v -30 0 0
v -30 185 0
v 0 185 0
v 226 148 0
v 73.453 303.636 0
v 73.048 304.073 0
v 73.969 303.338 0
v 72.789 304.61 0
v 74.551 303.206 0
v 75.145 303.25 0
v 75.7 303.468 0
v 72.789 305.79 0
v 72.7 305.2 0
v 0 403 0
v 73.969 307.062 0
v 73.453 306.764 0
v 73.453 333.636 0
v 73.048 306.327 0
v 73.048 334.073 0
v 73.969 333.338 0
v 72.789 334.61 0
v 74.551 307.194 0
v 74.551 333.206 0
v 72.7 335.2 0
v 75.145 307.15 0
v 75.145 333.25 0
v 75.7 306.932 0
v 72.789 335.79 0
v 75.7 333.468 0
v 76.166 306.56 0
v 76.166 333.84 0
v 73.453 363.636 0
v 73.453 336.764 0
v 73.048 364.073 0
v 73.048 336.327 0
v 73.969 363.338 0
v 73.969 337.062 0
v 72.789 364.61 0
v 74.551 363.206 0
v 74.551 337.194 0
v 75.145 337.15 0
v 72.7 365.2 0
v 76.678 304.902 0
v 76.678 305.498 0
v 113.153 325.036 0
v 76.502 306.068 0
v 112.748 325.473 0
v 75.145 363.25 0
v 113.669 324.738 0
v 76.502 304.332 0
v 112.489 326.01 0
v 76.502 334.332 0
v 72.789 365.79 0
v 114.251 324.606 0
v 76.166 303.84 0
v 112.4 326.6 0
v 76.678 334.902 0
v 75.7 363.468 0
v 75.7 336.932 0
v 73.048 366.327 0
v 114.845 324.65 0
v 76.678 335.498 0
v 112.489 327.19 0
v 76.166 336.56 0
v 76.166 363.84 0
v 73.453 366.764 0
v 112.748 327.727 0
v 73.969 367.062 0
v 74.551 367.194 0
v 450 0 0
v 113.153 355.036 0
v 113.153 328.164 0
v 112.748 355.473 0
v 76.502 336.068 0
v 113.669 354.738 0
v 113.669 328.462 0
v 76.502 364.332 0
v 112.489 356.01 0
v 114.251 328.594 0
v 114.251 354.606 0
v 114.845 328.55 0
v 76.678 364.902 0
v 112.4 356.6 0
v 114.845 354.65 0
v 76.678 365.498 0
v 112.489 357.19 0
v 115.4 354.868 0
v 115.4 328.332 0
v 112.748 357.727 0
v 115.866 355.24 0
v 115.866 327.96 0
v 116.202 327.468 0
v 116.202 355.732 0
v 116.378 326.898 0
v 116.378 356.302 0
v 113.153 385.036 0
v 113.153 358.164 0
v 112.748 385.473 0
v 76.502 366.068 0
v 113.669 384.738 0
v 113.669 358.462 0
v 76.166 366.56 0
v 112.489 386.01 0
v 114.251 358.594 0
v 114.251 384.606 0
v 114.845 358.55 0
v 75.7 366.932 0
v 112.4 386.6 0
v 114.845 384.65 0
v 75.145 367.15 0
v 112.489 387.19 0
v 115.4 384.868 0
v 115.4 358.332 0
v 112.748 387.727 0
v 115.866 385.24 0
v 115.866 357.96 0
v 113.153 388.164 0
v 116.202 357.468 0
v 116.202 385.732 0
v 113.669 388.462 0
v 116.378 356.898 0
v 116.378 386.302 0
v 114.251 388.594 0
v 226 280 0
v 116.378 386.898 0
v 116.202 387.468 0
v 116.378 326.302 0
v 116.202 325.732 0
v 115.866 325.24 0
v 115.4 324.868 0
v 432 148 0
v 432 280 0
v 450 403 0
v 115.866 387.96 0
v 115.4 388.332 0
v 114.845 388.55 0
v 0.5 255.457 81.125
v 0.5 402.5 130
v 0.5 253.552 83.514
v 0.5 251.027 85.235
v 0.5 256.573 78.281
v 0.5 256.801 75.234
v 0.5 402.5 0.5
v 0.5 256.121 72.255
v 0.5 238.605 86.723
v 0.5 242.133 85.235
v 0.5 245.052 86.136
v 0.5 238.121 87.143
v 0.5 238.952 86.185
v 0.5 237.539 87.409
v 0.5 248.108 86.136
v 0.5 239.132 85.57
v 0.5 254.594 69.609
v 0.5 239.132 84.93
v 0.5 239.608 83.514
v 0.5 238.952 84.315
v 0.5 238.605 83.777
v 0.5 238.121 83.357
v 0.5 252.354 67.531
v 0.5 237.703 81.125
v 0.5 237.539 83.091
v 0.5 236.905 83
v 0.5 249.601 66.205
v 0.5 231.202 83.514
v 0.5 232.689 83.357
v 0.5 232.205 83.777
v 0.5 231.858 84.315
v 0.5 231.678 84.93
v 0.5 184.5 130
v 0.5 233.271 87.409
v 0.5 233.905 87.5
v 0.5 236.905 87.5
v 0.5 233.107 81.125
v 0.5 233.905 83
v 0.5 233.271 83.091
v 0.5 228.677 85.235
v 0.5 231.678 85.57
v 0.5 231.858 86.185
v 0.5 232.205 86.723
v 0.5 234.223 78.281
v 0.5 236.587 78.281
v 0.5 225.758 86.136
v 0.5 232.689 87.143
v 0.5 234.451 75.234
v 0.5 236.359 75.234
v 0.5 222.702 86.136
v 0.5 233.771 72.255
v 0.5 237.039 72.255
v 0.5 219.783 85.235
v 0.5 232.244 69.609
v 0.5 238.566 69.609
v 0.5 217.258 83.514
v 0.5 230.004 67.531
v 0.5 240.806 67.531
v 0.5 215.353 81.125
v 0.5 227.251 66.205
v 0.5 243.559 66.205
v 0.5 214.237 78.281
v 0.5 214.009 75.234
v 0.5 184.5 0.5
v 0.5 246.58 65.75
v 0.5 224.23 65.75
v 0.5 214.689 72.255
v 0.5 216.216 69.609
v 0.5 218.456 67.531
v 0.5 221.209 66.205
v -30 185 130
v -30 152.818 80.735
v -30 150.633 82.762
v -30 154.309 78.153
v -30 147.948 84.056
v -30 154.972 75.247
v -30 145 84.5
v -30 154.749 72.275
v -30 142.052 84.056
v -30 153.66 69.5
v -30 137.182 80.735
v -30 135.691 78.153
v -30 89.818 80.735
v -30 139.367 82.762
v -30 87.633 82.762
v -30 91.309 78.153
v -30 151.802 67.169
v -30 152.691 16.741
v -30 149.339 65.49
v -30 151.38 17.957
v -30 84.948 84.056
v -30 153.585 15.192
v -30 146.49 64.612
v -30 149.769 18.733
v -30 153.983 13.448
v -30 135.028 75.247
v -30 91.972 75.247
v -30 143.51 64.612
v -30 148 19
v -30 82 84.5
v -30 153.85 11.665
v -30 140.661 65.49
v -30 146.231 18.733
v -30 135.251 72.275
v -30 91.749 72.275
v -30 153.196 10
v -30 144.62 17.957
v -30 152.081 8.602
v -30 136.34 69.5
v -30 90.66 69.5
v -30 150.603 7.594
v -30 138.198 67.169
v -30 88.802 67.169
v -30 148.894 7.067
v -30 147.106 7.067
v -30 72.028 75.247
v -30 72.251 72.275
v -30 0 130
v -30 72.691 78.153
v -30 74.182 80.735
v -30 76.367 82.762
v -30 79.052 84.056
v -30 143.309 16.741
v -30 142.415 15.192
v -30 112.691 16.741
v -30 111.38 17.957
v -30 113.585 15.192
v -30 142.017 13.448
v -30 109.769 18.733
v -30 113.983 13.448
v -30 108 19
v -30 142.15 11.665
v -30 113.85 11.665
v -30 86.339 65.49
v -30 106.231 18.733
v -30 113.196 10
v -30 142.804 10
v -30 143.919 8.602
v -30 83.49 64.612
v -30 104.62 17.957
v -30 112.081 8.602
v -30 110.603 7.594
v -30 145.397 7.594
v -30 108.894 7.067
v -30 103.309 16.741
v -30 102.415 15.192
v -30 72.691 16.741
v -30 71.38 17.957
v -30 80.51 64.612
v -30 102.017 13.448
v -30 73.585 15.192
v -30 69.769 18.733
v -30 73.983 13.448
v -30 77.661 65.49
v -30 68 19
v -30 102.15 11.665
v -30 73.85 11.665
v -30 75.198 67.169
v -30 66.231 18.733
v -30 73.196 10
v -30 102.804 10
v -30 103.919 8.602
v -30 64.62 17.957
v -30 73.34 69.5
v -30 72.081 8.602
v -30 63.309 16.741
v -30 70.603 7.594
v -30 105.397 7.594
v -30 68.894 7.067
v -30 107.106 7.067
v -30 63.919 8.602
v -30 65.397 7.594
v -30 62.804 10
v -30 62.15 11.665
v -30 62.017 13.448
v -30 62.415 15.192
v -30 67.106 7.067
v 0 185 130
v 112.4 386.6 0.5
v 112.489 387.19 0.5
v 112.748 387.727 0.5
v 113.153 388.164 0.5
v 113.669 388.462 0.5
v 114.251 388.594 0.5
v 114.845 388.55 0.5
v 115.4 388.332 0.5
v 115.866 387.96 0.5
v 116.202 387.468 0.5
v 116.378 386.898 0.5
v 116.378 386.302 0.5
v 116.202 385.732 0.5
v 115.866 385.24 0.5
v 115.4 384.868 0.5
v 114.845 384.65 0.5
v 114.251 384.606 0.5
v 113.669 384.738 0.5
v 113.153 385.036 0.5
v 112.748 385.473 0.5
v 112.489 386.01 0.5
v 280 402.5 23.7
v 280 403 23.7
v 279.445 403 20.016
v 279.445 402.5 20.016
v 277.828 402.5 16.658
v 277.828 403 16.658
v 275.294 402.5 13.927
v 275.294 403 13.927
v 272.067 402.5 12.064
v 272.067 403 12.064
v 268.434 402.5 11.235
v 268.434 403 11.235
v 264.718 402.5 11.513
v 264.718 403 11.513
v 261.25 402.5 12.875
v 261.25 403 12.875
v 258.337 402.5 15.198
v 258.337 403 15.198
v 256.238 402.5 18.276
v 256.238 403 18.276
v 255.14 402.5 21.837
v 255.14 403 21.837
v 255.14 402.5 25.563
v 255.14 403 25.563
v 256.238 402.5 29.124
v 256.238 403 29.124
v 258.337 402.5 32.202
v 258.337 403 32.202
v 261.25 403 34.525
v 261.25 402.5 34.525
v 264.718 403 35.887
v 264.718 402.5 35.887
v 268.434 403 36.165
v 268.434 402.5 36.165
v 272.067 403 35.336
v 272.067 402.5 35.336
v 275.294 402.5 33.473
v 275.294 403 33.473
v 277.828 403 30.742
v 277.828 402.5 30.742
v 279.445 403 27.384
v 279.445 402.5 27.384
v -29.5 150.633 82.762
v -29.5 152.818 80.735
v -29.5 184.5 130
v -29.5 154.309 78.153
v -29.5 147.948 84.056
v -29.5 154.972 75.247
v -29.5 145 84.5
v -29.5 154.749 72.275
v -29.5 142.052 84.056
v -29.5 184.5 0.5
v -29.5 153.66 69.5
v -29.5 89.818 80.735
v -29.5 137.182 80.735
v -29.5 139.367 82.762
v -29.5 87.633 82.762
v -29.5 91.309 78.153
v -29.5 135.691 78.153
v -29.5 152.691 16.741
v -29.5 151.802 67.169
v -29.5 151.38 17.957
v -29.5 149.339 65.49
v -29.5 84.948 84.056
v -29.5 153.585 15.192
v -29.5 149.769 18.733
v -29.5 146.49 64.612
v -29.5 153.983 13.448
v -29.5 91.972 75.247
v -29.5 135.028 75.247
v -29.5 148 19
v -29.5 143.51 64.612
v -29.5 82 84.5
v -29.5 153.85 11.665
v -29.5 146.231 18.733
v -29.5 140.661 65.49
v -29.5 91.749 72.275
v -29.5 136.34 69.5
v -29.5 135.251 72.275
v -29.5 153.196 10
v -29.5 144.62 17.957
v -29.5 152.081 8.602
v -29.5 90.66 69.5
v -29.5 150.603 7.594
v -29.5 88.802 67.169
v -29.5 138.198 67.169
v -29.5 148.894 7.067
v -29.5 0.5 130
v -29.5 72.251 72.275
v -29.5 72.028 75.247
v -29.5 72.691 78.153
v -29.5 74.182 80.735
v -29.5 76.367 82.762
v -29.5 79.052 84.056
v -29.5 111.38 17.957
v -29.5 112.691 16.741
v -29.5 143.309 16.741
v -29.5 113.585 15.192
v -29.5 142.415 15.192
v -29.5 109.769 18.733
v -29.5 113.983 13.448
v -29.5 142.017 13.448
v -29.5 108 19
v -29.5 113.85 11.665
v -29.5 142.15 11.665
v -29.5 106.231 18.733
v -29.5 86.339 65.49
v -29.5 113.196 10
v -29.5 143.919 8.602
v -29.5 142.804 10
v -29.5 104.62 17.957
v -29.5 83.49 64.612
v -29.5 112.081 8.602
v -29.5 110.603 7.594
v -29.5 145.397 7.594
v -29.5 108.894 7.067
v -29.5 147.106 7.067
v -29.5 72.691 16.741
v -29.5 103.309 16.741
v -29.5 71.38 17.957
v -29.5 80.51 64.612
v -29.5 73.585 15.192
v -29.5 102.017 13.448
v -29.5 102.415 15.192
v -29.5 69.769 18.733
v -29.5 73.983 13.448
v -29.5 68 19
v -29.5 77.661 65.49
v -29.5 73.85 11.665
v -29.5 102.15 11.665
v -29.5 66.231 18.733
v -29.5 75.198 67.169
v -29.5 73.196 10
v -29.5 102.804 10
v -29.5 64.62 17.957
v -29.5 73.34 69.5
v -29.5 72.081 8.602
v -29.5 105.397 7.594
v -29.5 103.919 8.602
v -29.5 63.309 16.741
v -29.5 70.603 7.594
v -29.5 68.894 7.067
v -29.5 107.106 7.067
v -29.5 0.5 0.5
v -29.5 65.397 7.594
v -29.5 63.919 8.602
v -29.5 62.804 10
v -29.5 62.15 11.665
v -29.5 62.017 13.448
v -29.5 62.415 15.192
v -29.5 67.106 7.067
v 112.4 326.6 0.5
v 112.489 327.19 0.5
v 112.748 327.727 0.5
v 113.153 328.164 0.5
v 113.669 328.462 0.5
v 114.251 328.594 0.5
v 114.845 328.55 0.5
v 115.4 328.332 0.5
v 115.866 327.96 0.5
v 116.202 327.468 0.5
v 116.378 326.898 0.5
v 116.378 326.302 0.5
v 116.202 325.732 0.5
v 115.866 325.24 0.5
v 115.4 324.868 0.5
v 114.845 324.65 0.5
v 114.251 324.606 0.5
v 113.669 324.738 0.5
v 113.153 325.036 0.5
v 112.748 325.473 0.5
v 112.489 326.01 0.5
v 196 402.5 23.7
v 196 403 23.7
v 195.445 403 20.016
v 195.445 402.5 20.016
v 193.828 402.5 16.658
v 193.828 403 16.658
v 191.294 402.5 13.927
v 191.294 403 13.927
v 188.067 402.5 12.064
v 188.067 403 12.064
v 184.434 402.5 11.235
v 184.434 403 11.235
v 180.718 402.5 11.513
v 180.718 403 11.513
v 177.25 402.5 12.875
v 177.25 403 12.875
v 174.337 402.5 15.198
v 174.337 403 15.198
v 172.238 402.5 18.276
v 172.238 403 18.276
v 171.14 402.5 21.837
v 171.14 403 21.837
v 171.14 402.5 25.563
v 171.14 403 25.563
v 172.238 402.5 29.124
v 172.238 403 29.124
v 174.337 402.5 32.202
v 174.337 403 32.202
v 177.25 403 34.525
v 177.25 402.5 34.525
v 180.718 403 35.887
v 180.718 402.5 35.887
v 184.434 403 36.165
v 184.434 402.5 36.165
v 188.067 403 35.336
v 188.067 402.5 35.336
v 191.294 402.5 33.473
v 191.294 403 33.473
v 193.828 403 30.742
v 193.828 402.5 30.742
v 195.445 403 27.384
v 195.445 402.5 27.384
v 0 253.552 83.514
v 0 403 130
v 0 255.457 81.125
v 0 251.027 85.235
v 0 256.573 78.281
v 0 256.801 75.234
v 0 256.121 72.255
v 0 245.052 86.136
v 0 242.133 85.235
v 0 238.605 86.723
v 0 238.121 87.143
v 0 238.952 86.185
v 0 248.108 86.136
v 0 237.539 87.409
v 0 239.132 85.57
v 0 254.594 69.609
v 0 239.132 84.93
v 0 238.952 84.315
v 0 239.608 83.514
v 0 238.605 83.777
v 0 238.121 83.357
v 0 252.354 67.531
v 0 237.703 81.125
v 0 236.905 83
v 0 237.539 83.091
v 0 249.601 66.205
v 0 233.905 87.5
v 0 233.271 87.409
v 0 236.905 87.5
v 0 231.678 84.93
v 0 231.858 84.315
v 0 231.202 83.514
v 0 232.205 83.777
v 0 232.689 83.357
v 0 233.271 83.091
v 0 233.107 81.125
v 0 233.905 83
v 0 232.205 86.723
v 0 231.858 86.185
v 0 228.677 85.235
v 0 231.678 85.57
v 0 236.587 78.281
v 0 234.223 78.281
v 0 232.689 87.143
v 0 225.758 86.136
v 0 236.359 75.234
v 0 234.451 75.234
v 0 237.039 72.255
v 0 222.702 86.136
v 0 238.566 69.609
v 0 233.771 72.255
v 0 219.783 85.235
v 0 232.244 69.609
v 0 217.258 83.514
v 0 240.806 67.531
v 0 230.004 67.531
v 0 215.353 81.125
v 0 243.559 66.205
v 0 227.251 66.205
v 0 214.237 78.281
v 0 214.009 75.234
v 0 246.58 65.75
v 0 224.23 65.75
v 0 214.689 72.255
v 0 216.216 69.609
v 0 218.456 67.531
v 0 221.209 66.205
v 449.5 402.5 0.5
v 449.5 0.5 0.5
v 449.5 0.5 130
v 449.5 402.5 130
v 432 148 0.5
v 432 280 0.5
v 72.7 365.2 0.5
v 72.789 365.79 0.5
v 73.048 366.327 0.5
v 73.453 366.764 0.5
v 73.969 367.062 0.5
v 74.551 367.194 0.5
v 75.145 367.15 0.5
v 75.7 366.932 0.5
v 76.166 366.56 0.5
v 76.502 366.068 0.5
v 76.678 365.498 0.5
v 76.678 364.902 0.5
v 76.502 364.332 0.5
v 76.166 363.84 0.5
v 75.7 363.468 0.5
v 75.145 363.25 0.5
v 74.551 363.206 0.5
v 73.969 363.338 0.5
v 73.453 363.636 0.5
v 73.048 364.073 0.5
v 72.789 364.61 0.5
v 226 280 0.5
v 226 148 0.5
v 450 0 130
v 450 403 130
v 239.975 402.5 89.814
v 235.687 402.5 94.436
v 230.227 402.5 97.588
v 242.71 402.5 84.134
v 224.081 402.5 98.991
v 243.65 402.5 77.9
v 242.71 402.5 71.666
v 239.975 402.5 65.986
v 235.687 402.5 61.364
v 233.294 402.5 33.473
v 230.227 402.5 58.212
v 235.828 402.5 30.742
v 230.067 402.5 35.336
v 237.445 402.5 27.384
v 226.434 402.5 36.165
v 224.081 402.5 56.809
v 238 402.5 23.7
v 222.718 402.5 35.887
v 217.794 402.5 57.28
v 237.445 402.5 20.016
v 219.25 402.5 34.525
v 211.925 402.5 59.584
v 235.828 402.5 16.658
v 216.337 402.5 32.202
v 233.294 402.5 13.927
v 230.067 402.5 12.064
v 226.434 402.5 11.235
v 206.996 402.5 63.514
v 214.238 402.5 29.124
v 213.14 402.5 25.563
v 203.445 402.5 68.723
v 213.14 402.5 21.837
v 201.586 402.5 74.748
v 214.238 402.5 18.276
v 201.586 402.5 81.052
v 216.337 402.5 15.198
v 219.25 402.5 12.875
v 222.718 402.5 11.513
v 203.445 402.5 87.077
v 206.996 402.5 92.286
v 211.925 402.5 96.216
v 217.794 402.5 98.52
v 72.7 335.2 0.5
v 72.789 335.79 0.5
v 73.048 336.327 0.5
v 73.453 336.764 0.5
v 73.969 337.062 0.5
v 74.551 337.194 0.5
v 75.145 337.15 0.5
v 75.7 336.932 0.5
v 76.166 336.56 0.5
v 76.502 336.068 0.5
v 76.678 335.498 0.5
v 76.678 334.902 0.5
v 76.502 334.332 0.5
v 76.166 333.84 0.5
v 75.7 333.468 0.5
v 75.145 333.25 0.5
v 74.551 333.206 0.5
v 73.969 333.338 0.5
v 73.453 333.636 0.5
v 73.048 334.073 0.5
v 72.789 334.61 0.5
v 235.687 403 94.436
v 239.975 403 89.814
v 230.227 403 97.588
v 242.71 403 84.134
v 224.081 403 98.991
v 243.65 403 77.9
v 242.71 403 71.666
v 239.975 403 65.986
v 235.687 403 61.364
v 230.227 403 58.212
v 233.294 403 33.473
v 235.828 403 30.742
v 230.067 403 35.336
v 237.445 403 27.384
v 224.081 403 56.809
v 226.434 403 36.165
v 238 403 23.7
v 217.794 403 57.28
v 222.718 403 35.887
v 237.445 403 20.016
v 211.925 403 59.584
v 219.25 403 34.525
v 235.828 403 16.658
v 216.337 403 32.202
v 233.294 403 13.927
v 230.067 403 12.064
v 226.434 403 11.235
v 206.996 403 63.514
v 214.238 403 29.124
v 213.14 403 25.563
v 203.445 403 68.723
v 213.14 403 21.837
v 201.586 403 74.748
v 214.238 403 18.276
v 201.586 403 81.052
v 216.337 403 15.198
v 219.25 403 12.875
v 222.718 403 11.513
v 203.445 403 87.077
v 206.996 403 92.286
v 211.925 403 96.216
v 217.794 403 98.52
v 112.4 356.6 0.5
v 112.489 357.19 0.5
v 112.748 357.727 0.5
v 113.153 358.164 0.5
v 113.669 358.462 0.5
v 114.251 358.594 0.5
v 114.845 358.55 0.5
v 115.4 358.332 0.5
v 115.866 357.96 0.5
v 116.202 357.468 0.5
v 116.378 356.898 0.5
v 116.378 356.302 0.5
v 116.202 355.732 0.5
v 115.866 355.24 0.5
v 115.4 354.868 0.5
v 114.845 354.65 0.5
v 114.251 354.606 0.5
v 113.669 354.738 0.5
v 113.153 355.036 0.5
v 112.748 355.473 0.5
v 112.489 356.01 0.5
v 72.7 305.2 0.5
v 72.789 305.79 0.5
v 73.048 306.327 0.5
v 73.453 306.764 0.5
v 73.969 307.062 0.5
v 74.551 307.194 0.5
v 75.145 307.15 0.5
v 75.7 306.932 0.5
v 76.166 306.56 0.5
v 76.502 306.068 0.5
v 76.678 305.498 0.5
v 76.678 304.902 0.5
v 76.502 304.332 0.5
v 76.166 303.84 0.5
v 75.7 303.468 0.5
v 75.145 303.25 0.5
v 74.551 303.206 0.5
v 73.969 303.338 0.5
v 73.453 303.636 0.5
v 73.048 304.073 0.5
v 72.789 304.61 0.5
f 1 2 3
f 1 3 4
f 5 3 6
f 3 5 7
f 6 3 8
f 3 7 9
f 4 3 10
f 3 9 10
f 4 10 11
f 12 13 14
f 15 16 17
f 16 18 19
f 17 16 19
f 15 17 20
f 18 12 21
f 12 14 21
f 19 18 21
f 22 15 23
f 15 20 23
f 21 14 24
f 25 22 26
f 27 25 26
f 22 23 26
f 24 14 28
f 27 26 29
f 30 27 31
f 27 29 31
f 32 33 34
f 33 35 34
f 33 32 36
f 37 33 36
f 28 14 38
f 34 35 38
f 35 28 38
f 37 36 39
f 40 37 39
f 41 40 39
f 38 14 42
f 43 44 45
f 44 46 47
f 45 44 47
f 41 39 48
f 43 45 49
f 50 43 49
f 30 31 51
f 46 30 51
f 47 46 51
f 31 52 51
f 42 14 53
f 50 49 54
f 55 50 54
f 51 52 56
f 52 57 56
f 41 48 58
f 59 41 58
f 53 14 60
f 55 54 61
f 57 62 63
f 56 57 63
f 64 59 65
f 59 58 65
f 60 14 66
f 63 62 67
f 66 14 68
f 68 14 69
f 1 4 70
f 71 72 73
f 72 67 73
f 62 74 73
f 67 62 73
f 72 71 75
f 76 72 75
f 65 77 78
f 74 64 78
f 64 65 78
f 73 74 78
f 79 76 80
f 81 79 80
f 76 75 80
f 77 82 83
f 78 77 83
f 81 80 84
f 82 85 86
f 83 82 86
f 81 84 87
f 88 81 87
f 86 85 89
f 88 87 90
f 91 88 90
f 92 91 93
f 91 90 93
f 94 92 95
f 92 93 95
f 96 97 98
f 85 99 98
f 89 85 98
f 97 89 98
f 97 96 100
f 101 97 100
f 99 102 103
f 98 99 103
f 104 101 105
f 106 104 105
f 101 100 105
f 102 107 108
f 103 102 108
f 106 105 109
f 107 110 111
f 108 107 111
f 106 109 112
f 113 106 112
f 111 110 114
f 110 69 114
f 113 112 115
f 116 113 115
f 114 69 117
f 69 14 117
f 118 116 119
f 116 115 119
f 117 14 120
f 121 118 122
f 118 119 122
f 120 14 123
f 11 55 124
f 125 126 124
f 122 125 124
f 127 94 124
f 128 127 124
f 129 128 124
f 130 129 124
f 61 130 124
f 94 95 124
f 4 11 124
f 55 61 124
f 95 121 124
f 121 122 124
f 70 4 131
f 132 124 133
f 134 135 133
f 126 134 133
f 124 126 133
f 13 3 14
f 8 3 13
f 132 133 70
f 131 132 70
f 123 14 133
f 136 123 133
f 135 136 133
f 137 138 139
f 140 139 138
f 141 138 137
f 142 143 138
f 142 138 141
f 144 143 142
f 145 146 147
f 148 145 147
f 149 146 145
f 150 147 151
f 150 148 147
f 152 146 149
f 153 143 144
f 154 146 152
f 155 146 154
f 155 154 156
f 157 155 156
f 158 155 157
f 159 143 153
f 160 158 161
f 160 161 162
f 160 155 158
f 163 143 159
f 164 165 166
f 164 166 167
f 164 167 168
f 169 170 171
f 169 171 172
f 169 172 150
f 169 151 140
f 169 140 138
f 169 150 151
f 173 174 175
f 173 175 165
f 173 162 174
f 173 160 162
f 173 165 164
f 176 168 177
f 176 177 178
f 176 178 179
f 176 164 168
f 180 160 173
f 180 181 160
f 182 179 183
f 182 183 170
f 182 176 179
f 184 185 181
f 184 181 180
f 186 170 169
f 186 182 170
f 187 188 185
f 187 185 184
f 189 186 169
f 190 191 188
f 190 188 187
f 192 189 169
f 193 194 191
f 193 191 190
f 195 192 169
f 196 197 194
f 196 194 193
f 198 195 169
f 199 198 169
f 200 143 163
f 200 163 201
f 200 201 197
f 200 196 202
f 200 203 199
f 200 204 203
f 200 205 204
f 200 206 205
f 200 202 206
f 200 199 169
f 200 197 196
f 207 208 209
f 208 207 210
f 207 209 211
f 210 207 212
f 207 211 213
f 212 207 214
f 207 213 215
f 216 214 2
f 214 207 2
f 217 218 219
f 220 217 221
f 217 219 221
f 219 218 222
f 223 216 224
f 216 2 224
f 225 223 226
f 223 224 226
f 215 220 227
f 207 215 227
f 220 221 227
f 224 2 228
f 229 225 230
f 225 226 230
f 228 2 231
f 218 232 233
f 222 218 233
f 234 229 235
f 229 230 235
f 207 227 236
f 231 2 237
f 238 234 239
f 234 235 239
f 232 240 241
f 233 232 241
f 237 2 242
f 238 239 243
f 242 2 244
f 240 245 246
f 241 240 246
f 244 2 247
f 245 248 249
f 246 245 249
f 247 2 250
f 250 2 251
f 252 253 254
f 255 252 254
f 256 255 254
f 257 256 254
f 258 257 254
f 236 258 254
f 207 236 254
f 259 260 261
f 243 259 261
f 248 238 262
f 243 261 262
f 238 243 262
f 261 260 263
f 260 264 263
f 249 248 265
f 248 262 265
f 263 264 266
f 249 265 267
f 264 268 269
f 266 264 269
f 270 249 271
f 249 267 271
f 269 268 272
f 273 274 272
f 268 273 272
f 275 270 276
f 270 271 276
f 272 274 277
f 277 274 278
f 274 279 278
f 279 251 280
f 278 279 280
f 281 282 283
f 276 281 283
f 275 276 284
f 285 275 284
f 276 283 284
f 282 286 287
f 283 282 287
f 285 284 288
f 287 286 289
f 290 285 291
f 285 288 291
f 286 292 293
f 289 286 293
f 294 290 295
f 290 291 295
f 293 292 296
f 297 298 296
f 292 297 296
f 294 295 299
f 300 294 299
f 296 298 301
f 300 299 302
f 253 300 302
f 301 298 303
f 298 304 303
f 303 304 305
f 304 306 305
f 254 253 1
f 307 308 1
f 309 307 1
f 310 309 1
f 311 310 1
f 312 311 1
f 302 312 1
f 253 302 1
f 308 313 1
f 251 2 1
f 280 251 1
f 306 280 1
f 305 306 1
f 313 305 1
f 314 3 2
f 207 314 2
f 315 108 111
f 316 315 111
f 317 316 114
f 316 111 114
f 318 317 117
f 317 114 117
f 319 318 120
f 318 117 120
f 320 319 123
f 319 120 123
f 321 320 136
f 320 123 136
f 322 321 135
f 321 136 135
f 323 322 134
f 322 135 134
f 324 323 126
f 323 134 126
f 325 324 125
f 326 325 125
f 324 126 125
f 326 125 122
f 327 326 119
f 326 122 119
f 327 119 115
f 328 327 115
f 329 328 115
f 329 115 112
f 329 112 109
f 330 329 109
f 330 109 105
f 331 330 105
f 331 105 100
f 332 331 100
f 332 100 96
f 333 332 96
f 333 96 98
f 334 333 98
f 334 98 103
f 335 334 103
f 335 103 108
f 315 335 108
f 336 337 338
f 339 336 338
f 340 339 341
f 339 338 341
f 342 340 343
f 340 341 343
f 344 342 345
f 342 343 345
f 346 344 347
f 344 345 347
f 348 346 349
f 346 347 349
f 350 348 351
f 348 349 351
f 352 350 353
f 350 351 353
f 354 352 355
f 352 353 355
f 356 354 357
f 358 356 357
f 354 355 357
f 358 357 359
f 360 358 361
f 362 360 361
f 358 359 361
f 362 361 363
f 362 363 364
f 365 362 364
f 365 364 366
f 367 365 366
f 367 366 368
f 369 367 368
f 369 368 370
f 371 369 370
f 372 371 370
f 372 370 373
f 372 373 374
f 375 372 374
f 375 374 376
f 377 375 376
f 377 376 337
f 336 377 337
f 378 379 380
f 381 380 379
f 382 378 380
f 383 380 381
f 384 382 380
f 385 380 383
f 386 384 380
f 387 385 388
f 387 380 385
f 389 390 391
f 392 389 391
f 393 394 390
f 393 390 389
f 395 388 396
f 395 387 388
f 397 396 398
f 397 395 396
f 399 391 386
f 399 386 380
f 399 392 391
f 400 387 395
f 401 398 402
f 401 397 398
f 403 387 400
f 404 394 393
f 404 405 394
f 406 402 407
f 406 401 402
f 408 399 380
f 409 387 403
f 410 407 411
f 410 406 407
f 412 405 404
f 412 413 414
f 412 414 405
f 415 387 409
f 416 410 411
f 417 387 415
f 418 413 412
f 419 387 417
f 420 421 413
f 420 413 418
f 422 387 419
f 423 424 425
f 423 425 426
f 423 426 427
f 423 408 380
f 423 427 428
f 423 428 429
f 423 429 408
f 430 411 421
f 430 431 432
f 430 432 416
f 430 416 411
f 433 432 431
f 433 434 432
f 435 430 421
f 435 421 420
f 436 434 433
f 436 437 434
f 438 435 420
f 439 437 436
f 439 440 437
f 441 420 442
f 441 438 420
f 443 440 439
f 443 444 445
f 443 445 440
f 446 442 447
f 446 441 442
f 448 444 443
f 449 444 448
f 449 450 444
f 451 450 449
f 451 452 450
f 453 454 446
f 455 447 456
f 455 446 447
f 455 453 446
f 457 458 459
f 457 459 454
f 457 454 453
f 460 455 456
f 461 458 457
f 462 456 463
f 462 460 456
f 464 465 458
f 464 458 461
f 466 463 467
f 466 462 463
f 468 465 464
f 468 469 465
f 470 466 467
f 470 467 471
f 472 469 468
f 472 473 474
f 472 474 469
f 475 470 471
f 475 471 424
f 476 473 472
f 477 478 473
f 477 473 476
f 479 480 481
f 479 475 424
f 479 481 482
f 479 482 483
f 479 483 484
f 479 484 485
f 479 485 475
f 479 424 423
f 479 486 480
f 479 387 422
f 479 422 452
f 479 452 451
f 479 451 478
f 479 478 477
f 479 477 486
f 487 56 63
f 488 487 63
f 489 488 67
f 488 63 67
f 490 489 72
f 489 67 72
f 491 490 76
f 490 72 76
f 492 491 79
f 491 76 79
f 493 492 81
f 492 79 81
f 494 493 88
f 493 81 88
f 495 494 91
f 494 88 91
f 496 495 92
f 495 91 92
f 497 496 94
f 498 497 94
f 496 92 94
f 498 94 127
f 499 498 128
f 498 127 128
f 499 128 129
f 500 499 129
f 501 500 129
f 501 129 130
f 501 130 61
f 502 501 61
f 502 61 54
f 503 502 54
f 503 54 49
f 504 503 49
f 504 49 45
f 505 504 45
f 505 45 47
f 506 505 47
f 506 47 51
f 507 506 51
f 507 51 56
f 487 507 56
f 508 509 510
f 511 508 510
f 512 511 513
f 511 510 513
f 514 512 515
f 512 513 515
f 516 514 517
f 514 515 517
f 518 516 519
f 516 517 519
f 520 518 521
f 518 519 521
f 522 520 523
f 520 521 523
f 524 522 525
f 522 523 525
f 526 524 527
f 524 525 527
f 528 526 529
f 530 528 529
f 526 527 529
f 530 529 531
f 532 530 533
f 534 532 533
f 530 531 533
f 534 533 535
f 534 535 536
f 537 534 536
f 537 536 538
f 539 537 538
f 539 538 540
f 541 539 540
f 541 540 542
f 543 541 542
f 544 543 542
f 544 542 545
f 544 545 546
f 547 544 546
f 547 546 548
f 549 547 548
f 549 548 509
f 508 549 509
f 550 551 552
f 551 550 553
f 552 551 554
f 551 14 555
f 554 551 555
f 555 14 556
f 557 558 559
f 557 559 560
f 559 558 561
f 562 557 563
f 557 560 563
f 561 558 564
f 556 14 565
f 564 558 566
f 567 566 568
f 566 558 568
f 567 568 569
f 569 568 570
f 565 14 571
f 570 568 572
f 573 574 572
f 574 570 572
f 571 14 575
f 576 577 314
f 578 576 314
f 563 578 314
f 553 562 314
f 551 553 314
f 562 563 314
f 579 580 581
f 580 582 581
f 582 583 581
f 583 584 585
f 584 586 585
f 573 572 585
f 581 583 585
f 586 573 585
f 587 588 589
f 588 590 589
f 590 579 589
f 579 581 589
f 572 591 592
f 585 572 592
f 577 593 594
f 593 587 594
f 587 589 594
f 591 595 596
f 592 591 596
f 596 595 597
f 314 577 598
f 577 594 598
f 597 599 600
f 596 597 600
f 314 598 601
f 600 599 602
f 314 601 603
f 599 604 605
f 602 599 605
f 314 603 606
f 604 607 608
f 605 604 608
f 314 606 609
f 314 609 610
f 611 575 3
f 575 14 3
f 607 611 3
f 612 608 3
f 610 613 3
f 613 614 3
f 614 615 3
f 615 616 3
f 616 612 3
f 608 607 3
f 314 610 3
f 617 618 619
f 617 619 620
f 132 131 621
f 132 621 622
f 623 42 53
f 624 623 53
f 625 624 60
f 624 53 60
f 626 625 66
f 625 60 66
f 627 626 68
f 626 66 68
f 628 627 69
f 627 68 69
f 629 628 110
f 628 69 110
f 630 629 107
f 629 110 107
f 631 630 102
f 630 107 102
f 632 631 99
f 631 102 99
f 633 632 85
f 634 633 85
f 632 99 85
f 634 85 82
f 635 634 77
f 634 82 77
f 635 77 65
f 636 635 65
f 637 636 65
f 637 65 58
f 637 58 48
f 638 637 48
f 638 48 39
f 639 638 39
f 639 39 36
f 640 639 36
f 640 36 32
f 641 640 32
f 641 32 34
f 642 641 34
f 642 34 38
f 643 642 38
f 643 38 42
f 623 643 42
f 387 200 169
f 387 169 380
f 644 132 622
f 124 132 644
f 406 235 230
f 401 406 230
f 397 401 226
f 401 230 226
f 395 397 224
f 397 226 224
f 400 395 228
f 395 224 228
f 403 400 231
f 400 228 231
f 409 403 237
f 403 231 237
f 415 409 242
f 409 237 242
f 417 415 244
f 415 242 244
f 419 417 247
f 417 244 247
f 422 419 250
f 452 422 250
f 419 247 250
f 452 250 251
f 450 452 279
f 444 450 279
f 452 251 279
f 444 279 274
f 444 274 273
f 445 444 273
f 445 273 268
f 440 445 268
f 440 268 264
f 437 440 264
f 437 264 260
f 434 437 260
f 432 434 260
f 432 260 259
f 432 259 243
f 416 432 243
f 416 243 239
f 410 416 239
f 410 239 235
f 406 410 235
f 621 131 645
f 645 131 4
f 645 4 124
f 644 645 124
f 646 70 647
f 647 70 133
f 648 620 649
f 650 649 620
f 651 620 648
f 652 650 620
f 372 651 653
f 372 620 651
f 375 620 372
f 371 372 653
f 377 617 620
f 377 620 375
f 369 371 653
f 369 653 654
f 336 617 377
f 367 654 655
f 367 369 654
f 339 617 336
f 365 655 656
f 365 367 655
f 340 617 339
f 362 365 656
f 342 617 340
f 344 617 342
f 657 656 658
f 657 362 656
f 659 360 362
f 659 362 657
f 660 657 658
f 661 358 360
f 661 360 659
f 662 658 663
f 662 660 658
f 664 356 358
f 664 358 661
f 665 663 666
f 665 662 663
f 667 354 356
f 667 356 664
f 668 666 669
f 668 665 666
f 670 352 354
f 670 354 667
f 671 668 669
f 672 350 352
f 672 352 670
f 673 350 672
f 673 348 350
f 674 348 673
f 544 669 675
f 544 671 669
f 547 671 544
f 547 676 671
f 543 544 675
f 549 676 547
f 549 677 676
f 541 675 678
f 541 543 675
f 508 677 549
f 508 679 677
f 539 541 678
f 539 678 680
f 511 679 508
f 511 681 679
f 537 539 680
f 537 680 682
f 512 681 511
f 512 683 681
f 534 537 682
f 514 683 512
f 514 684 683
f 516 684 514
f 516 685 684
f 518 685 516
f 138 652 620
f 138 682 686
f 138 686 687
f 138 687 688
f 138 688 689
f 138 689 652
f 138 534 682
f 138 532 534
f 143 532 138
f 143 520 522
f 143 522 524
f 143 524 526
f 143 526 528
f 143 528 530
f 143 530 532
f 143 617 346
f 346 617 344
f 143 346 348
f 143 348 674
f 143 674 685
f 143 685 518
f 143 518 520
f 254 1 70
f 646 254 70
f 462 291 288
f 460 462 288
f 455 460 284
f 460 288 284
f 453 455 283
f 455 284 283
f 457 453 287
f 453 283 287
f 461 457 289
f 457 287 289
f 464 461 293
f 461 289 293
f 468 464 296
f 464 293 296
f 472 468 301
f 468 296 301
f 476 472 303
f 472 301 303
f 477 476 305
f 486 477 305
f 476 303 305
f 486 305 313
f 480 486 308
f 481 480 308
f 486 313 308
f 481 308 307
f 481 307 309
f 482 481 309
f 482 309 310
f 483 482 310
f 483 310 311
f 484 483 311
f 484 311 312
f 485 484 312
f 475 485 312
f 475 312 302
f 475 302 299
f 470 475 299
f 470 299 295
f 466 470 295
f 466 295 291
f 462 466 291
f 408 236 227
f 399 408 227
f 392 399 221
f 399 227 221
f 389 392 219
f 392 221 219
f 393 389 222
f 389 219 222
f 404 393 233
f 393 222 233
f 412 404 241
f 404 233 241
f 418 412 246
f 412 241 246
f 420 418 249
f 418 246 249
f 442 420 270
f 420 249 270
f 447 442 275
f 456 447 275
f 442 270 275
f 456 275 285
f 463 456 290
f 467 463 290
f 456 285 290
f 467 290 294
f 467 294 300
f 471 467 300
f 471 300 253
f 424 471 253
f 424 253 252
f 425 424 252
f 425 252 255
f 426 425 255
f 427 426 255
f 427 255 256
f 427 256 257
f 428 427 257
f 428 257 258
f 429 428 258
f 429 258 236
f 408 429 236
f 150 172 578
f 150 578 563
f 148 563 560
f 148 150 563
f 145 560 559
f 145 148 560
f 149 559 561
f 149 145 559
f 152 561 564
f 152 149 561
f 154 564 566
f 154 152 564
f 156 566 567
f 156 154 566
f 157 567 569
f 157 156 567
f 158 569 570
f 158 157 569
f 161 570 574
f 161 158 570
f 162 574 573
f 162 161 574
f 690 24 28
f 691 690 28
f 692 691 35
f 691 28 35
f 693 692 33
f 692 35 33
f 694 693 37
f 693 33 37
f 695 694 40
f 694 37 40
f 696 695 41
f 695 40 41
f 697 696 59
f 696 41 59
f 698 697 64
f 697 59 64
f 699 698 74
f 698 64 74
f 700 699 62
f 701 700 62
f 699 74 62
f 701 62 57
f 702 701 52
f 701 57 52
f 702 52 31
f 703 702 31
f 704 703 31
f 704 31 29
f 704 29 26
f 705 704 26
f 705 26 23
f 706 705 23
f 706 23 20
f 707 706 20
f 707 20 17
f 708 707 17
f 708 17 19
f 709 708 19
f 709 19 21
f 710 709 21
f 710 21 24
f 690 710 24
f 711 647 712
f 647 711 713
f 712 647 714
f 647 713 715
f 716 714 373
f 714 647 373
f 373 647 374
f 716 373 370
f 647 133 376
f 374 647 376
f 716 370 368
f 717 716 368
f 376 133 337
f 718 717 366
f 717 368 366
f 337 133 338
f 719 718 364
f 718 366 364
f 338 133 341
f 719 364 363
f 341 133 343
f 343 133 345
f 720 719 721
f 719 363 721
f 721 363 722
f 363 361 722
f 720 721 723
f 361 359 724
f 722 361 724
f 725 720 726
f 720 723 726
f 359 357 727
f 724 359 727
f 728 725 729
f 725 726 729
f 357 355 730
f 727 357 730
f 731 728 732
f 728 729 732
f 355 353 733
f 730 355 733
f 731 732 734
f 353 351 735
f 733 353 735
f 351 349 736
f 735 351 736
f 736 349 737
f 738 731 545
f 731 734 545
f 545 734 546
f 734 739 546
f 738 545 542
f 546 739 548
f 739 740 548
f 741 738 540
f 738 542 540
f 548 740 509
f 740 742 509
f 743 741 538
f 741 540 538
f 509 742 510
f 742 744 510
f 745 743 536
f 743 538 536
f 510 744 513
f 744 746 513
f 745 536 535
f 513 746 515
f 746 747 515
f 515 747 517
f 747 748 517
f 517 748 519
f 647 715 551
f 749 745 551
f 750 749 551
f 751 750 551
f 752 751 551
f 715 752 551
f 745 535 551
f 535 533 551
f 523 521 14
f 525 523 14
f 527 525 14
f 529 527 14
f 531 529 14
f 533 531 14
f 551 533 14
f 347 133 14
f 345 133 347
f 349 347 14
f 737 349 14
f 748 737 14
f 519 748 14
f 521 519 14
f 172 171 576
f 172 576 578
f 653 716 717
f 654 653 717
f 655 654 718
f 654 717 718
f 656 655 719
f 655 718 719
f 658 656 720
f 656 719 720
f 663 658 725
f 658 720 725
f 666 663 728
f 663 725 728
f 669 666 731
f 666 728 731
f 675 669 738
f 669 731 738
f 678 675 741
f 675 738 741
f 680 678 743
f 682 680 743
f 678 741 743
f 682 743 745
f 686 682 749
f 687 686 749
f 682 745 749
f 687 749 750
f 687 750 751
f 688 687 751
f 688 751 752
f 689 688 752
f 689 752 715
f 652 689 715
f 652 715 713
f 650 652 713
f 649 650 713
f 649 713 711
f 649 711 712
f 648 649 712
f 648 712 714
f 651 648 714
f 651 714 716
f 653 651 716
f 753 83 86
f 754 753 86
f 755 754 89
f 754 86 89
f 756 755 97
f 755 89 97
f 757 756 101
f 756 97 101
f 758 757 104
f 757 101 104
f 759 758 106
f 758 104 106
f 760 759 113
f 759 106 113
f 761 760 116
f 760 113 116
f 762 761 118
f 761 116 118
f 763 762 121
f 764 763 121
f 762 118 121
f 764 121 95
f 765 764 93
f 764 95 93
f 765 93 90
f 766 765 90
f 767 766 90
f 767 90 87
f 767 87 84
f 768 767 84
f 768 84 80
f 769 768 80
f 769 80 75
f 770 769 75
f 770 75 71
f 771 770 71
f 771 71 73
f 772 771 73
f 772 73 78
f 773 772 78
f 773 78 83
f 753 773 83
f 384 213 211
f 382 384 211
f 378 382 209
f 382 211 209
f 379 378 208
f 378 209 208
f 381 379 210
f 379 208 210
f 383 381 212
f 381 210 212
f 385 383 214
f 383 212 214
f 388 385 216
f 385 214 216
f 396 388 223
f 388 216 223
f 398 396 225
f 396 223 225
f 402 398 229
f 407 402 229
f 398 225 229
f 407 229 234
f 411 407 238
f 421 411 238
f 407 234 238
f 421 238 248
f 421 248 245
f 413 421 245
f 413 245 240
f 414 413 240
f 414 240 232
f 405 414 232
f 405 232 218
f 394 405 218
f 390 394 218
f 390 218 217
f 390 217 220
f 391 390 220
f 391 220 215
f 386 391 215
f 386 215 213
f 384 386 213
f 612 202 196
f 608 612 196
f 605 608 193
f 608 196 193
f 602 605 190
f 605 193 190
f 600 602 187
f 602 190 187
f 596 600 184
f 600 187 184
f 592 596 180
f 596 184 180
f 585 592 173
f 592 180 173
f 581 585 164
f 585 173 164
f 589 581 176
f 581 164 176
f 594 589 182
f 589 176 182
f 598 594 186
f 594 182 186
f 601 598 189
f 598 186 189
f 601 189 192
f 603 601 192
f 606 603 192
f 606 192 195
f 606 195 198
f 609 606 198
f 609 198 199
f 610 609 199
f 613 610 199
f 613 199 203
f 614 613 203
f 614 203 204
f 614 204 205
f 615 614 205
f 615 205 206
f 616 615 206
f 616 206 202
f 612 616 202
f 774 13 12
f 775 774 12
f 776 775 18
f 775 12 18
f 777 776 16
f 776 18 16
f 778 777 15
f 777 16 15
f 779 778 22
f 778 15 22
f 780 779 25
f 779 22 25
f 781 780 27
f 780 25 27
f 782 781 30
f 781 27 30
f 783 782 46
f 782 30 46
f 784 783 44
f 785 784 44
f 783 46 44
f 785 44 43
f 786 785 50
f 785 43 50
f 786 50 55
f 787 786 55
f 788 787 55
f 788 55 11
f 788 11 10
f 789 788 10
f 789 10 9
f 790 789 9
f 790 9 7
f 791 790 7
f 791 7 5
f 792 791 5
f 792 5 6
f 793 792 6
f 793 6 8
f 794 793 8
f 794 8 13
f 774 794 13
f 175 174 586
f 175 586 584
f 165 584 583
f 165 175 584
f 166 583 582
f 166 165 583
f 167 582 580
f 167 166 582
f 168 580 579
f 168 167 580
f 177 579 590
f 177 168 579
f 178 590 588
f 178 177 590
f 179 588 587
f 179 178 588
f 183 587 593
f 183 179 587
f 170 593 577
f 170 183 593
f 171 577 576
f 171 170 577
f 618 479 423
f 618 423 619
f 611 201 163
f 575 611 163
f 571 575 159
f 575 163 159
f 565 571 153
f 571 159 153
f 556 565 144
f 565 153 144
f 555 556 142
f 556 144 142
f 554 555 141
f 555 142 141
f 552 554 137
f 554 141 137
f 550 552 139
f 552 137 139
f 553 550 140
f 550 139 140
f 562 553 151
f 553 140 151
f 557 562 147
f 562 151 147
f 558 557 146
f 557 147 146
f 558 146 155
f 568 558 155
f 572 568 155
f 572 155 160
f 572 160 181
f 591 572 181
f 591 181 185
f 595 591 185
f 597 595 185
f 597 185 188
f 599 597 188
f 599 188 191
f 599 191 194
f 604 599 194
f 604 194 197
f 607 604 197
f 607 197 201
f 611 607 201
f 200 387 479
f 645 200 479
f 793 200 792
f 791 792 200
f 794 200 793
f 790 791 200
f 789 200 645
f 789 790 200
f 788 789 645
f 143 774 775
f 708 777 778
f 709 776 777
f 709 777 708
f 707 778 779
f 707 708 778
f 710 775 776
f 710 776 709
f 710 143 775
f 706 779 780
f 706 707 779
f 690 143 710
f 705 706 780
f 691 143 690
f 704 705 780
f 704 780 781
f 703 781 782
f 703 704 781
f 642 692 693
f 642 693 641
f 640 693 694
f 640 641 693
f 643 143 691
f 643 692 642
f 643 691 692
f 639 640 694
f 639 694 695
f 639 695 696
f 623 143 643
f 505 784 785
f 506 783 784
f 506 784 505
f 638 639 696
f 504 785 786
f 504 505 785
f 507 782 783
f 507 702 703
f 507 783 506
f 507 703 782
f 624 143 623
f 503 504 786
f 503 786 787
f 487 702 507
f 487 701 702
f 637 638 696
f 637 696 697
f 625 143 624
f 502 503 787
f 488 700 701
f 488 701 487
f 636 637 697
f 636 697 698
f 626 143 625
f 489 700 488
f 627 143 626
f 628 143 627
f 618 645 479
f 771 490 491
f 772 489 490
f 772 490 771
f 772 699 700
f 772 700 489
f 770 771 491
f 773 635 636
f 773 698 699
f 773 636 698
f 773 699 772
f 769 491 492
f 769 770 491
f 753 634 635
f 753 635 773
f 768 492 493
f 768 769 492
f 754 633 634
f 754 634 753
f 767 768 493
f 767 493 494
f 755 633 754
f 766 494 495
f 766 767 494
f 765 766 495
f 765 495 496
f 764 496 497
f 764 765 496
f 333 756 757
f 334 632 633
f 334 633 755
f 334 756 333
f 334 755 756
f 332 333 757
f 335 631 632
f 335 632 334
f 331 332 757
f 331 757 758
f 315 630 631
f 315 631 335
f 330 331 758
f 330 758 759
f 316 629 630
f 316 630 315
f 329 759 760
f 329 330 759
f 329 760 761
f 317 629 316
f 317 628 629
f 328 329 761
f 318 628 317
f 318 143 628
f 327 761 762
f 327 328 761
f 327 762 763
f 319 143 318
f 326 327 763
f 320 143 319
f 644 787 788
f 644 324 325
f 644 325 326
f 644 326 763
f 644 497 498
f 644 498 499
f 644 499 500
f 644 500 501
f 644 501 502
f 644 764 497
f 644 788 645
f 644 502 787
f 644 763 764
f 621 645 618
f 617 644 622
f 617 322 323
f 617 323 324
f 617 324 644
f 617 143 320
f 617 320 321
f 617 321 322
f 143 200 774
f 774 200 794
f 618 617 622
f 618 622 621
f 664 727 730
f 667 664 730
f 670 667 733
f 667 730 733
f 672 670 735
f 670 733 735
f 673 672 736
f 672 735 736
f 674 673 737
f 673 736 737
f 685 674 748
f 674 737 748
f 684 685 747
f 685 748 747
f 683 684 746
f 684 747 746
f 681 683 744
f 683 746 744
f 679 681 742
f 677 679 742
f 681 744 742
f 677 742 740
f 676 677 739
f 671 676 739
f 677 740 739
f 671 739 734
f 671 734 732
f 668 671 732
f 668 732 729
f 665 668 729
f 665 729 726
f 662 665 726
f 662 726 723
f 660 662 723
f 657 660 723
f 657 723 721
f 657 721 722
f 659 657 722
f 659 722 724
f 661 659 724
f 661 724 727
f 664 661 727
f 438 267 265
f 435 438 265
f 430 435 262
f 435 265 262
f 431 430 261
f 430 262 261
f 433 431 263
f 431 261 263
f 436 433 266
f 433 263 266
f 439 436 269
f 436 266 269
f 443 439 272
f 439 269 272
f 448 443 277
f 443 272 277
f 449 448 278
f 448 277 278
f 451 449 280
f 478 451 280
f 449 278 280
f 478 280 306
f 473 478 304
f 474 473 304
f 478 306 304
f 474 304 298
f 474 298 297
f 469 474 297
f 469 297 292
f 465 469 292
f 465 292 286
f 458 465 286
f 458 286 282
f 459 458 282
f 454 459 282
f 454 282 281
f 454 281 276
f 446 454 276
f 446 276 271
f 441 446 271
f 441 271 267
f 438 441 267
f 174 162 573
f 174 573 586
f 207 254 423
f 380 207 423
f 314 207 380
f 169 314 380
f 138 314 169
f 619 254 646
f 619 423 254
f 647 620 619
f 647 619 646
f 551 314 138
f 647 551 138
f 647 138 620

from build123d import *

# Parameters (mm, degrees)
DODANIE_WYCI_GNI_CIE1_DEPTH = 130
SKORUPA1_T                  = -0.5
WYTNIJ_WYCI_GNI_CIE1_REACH  = 132
SZKIC2_W                    = 206
SZKIC2_H                    = 132
SZKIC4_R                    = 2
WYTNIJ_WYCI_GNI_CIE2_DEPTH  = 10
SZKIC5_R                    = 21.15
SZKIC5_R_2                  = 12.5
WYTNIJ_WYCI_GNI_CIE3_DEPTH  = 10
SZKIC6_R                    = 10
SZKIC6_R_2                  = 6
WYTNIJ_WYCI_GNI_CIE4_DEPTH  = 10
SZKIC7_R                    = 10.25
WYTNIJ_WYCI_GNI_CIE5_DEPTH  = 10


with BuildPart() as part:
    # Szkic1 → Dodanie-wyciągnięcie1 (new body)
    with BuildSketch(Plane.XY):
        Polygon((0, 403), (0, 185), (-30, 185), (-30, 0), (450, 0), (450, 403), align=None)
    extrude(amount=DODANIE_WYCI_GNI_CIE1_DEPTH)

    # Skorupa1
    skorupa1_openings = [part.faces().sort_by_distance(p)[0] for p in [
        (140, 196, 130),
    ]]
    offset(amount=SKORUPA1_T, openings=skorupa1_openings, kind=Kind.INTERSECTION)

    # Szkic2 → Wytnij-wyciągnięcie1 (cut, up to next)
    with BuildSketch(Plane(origin=(0, 0, 0), x_dir=(-1, 0, 0), z_dir=(0, 0, -1)), mode=Mode.PRIVATE) as wytnij_wyci_gni_cie1_sk1:
        with Locations((-329, 214)):
            Rectangle(SZKIC2_W, SZKIC2_H)
    wytnij_wyci_gni_cie1_tool1 = extrude(wytnij_wyci_gni_cie1_sk1.sketch, amount=-WYTNIJ_WYCI_GNI_CIE1_REACH, mode=Mode.PRIVATE) & part.part
    add(wytnij_wyci_gni_cie1_tool1.solids().sort_by_distance((329, 214, 0))[0], mode=Mode.SUBTRACT)

    # Szkic4 → Wytnij-wyciągnięcie2 (cut)
    with BuildSketch(Plane(origin=(0, 0, 0), x_dir=(-1, 0, 0), z_dir=(0, 0, -1))):
        with Locations((-114.4, 386.6)):
            Circle(SZKIC4_R)
        with Locations((-74.7, 365.2)):
            Circle(SZKIC4_R)
        with Locations((-74.7, 335.2)):
            Circle(SZKIC4_R)
        with Locations((-114.4, 356.6)):
            Circle(SZKIC4_R)
        with Locations((-74.7, 305.2)):
            Circle(SZKIC4_R)
        with Locations((-114.4, 326.6)):
            Circle(SZKIC4_R)
    extrude(amount=-WYTNIJ_WYCI_GNI_CIE2_DEPTH, mode=Mode.SUBTRACT)

    # Szkic5 → Wytnij-wyciągnięcie3 (cut)
    with BuildSketch(Plane(origin=(0, 403, 0), x_dir=(1, 0, 0), z_dir=(0, 1, 0))):
        with Locations((222.5, -77.9)):
            Circle(SZKIC5_R)
        with Locations((225.5, -23.7)):
            Circle(SZKIC5_R_2)
        with Locations((267.5, -23.7)):
            Circle(SZKIC5_R_2)
        with Locations((183.5, -23.7)):
            Circle(SZKIC5_R_2)
    extrude(amount=-WYTNIJ_WYCI_GNI_CIE3_DEPTH, mode=Mode.SUBTRACT)

    # Szkic6 → Wytnij-wyciągnięcie4 (cut)
    with BuildSketch(Plane.ZY.offset(30)):
        with Locations((74.5, 145)):
            Circle(SZKIC6_R)
        with Locations((74.5, 82)):
            Circle(SZKIC6_R)
        with Locations((13, 148)):
            Circle(SZKIC6_R_2)
        with Locations((13, 108)):
            Circle(SZKIC6_R_2)
        with Locations((13, 68)):
            Circle(SZKIC6_R_2)
    extrude(amount=-WYTNIJ_WYCI_GNI_CIE4_DEPTH, mode=Mode.SUBTRACT)

    # Szkic7 → Wytnij-wyciągnięcie5 (cut)
    with BuildSketch(Plane(origin=(0.5, 0, 0), x_dir=(0, 0, -1), z_dir=(1, 0, 0))):
        with Locations((-76, 224.23)):
            Circle(SZKIC7_R)
        with Locations((-76, 246.58)):
            Circle(SZKIC7_R)
        with BuildLine():
            Line((-87.5, 233.905), (-87.5, 236.905))
            ThreePointArc((-87.5, 236.905), (-85.25, 239.155), (-83, 236.905))
            Line((-83, 236.905), (-83, 233.905))
            ThreePointArc((-83, 233.905), (-85.25, 231.655), (-87.5, 233.905))
        make_face()
    extrude(amount=-WYTNIJ_WYCI_GNI_CIE5_DEPTH, mode=Mode.SUBTRACT)


solid = part.part
